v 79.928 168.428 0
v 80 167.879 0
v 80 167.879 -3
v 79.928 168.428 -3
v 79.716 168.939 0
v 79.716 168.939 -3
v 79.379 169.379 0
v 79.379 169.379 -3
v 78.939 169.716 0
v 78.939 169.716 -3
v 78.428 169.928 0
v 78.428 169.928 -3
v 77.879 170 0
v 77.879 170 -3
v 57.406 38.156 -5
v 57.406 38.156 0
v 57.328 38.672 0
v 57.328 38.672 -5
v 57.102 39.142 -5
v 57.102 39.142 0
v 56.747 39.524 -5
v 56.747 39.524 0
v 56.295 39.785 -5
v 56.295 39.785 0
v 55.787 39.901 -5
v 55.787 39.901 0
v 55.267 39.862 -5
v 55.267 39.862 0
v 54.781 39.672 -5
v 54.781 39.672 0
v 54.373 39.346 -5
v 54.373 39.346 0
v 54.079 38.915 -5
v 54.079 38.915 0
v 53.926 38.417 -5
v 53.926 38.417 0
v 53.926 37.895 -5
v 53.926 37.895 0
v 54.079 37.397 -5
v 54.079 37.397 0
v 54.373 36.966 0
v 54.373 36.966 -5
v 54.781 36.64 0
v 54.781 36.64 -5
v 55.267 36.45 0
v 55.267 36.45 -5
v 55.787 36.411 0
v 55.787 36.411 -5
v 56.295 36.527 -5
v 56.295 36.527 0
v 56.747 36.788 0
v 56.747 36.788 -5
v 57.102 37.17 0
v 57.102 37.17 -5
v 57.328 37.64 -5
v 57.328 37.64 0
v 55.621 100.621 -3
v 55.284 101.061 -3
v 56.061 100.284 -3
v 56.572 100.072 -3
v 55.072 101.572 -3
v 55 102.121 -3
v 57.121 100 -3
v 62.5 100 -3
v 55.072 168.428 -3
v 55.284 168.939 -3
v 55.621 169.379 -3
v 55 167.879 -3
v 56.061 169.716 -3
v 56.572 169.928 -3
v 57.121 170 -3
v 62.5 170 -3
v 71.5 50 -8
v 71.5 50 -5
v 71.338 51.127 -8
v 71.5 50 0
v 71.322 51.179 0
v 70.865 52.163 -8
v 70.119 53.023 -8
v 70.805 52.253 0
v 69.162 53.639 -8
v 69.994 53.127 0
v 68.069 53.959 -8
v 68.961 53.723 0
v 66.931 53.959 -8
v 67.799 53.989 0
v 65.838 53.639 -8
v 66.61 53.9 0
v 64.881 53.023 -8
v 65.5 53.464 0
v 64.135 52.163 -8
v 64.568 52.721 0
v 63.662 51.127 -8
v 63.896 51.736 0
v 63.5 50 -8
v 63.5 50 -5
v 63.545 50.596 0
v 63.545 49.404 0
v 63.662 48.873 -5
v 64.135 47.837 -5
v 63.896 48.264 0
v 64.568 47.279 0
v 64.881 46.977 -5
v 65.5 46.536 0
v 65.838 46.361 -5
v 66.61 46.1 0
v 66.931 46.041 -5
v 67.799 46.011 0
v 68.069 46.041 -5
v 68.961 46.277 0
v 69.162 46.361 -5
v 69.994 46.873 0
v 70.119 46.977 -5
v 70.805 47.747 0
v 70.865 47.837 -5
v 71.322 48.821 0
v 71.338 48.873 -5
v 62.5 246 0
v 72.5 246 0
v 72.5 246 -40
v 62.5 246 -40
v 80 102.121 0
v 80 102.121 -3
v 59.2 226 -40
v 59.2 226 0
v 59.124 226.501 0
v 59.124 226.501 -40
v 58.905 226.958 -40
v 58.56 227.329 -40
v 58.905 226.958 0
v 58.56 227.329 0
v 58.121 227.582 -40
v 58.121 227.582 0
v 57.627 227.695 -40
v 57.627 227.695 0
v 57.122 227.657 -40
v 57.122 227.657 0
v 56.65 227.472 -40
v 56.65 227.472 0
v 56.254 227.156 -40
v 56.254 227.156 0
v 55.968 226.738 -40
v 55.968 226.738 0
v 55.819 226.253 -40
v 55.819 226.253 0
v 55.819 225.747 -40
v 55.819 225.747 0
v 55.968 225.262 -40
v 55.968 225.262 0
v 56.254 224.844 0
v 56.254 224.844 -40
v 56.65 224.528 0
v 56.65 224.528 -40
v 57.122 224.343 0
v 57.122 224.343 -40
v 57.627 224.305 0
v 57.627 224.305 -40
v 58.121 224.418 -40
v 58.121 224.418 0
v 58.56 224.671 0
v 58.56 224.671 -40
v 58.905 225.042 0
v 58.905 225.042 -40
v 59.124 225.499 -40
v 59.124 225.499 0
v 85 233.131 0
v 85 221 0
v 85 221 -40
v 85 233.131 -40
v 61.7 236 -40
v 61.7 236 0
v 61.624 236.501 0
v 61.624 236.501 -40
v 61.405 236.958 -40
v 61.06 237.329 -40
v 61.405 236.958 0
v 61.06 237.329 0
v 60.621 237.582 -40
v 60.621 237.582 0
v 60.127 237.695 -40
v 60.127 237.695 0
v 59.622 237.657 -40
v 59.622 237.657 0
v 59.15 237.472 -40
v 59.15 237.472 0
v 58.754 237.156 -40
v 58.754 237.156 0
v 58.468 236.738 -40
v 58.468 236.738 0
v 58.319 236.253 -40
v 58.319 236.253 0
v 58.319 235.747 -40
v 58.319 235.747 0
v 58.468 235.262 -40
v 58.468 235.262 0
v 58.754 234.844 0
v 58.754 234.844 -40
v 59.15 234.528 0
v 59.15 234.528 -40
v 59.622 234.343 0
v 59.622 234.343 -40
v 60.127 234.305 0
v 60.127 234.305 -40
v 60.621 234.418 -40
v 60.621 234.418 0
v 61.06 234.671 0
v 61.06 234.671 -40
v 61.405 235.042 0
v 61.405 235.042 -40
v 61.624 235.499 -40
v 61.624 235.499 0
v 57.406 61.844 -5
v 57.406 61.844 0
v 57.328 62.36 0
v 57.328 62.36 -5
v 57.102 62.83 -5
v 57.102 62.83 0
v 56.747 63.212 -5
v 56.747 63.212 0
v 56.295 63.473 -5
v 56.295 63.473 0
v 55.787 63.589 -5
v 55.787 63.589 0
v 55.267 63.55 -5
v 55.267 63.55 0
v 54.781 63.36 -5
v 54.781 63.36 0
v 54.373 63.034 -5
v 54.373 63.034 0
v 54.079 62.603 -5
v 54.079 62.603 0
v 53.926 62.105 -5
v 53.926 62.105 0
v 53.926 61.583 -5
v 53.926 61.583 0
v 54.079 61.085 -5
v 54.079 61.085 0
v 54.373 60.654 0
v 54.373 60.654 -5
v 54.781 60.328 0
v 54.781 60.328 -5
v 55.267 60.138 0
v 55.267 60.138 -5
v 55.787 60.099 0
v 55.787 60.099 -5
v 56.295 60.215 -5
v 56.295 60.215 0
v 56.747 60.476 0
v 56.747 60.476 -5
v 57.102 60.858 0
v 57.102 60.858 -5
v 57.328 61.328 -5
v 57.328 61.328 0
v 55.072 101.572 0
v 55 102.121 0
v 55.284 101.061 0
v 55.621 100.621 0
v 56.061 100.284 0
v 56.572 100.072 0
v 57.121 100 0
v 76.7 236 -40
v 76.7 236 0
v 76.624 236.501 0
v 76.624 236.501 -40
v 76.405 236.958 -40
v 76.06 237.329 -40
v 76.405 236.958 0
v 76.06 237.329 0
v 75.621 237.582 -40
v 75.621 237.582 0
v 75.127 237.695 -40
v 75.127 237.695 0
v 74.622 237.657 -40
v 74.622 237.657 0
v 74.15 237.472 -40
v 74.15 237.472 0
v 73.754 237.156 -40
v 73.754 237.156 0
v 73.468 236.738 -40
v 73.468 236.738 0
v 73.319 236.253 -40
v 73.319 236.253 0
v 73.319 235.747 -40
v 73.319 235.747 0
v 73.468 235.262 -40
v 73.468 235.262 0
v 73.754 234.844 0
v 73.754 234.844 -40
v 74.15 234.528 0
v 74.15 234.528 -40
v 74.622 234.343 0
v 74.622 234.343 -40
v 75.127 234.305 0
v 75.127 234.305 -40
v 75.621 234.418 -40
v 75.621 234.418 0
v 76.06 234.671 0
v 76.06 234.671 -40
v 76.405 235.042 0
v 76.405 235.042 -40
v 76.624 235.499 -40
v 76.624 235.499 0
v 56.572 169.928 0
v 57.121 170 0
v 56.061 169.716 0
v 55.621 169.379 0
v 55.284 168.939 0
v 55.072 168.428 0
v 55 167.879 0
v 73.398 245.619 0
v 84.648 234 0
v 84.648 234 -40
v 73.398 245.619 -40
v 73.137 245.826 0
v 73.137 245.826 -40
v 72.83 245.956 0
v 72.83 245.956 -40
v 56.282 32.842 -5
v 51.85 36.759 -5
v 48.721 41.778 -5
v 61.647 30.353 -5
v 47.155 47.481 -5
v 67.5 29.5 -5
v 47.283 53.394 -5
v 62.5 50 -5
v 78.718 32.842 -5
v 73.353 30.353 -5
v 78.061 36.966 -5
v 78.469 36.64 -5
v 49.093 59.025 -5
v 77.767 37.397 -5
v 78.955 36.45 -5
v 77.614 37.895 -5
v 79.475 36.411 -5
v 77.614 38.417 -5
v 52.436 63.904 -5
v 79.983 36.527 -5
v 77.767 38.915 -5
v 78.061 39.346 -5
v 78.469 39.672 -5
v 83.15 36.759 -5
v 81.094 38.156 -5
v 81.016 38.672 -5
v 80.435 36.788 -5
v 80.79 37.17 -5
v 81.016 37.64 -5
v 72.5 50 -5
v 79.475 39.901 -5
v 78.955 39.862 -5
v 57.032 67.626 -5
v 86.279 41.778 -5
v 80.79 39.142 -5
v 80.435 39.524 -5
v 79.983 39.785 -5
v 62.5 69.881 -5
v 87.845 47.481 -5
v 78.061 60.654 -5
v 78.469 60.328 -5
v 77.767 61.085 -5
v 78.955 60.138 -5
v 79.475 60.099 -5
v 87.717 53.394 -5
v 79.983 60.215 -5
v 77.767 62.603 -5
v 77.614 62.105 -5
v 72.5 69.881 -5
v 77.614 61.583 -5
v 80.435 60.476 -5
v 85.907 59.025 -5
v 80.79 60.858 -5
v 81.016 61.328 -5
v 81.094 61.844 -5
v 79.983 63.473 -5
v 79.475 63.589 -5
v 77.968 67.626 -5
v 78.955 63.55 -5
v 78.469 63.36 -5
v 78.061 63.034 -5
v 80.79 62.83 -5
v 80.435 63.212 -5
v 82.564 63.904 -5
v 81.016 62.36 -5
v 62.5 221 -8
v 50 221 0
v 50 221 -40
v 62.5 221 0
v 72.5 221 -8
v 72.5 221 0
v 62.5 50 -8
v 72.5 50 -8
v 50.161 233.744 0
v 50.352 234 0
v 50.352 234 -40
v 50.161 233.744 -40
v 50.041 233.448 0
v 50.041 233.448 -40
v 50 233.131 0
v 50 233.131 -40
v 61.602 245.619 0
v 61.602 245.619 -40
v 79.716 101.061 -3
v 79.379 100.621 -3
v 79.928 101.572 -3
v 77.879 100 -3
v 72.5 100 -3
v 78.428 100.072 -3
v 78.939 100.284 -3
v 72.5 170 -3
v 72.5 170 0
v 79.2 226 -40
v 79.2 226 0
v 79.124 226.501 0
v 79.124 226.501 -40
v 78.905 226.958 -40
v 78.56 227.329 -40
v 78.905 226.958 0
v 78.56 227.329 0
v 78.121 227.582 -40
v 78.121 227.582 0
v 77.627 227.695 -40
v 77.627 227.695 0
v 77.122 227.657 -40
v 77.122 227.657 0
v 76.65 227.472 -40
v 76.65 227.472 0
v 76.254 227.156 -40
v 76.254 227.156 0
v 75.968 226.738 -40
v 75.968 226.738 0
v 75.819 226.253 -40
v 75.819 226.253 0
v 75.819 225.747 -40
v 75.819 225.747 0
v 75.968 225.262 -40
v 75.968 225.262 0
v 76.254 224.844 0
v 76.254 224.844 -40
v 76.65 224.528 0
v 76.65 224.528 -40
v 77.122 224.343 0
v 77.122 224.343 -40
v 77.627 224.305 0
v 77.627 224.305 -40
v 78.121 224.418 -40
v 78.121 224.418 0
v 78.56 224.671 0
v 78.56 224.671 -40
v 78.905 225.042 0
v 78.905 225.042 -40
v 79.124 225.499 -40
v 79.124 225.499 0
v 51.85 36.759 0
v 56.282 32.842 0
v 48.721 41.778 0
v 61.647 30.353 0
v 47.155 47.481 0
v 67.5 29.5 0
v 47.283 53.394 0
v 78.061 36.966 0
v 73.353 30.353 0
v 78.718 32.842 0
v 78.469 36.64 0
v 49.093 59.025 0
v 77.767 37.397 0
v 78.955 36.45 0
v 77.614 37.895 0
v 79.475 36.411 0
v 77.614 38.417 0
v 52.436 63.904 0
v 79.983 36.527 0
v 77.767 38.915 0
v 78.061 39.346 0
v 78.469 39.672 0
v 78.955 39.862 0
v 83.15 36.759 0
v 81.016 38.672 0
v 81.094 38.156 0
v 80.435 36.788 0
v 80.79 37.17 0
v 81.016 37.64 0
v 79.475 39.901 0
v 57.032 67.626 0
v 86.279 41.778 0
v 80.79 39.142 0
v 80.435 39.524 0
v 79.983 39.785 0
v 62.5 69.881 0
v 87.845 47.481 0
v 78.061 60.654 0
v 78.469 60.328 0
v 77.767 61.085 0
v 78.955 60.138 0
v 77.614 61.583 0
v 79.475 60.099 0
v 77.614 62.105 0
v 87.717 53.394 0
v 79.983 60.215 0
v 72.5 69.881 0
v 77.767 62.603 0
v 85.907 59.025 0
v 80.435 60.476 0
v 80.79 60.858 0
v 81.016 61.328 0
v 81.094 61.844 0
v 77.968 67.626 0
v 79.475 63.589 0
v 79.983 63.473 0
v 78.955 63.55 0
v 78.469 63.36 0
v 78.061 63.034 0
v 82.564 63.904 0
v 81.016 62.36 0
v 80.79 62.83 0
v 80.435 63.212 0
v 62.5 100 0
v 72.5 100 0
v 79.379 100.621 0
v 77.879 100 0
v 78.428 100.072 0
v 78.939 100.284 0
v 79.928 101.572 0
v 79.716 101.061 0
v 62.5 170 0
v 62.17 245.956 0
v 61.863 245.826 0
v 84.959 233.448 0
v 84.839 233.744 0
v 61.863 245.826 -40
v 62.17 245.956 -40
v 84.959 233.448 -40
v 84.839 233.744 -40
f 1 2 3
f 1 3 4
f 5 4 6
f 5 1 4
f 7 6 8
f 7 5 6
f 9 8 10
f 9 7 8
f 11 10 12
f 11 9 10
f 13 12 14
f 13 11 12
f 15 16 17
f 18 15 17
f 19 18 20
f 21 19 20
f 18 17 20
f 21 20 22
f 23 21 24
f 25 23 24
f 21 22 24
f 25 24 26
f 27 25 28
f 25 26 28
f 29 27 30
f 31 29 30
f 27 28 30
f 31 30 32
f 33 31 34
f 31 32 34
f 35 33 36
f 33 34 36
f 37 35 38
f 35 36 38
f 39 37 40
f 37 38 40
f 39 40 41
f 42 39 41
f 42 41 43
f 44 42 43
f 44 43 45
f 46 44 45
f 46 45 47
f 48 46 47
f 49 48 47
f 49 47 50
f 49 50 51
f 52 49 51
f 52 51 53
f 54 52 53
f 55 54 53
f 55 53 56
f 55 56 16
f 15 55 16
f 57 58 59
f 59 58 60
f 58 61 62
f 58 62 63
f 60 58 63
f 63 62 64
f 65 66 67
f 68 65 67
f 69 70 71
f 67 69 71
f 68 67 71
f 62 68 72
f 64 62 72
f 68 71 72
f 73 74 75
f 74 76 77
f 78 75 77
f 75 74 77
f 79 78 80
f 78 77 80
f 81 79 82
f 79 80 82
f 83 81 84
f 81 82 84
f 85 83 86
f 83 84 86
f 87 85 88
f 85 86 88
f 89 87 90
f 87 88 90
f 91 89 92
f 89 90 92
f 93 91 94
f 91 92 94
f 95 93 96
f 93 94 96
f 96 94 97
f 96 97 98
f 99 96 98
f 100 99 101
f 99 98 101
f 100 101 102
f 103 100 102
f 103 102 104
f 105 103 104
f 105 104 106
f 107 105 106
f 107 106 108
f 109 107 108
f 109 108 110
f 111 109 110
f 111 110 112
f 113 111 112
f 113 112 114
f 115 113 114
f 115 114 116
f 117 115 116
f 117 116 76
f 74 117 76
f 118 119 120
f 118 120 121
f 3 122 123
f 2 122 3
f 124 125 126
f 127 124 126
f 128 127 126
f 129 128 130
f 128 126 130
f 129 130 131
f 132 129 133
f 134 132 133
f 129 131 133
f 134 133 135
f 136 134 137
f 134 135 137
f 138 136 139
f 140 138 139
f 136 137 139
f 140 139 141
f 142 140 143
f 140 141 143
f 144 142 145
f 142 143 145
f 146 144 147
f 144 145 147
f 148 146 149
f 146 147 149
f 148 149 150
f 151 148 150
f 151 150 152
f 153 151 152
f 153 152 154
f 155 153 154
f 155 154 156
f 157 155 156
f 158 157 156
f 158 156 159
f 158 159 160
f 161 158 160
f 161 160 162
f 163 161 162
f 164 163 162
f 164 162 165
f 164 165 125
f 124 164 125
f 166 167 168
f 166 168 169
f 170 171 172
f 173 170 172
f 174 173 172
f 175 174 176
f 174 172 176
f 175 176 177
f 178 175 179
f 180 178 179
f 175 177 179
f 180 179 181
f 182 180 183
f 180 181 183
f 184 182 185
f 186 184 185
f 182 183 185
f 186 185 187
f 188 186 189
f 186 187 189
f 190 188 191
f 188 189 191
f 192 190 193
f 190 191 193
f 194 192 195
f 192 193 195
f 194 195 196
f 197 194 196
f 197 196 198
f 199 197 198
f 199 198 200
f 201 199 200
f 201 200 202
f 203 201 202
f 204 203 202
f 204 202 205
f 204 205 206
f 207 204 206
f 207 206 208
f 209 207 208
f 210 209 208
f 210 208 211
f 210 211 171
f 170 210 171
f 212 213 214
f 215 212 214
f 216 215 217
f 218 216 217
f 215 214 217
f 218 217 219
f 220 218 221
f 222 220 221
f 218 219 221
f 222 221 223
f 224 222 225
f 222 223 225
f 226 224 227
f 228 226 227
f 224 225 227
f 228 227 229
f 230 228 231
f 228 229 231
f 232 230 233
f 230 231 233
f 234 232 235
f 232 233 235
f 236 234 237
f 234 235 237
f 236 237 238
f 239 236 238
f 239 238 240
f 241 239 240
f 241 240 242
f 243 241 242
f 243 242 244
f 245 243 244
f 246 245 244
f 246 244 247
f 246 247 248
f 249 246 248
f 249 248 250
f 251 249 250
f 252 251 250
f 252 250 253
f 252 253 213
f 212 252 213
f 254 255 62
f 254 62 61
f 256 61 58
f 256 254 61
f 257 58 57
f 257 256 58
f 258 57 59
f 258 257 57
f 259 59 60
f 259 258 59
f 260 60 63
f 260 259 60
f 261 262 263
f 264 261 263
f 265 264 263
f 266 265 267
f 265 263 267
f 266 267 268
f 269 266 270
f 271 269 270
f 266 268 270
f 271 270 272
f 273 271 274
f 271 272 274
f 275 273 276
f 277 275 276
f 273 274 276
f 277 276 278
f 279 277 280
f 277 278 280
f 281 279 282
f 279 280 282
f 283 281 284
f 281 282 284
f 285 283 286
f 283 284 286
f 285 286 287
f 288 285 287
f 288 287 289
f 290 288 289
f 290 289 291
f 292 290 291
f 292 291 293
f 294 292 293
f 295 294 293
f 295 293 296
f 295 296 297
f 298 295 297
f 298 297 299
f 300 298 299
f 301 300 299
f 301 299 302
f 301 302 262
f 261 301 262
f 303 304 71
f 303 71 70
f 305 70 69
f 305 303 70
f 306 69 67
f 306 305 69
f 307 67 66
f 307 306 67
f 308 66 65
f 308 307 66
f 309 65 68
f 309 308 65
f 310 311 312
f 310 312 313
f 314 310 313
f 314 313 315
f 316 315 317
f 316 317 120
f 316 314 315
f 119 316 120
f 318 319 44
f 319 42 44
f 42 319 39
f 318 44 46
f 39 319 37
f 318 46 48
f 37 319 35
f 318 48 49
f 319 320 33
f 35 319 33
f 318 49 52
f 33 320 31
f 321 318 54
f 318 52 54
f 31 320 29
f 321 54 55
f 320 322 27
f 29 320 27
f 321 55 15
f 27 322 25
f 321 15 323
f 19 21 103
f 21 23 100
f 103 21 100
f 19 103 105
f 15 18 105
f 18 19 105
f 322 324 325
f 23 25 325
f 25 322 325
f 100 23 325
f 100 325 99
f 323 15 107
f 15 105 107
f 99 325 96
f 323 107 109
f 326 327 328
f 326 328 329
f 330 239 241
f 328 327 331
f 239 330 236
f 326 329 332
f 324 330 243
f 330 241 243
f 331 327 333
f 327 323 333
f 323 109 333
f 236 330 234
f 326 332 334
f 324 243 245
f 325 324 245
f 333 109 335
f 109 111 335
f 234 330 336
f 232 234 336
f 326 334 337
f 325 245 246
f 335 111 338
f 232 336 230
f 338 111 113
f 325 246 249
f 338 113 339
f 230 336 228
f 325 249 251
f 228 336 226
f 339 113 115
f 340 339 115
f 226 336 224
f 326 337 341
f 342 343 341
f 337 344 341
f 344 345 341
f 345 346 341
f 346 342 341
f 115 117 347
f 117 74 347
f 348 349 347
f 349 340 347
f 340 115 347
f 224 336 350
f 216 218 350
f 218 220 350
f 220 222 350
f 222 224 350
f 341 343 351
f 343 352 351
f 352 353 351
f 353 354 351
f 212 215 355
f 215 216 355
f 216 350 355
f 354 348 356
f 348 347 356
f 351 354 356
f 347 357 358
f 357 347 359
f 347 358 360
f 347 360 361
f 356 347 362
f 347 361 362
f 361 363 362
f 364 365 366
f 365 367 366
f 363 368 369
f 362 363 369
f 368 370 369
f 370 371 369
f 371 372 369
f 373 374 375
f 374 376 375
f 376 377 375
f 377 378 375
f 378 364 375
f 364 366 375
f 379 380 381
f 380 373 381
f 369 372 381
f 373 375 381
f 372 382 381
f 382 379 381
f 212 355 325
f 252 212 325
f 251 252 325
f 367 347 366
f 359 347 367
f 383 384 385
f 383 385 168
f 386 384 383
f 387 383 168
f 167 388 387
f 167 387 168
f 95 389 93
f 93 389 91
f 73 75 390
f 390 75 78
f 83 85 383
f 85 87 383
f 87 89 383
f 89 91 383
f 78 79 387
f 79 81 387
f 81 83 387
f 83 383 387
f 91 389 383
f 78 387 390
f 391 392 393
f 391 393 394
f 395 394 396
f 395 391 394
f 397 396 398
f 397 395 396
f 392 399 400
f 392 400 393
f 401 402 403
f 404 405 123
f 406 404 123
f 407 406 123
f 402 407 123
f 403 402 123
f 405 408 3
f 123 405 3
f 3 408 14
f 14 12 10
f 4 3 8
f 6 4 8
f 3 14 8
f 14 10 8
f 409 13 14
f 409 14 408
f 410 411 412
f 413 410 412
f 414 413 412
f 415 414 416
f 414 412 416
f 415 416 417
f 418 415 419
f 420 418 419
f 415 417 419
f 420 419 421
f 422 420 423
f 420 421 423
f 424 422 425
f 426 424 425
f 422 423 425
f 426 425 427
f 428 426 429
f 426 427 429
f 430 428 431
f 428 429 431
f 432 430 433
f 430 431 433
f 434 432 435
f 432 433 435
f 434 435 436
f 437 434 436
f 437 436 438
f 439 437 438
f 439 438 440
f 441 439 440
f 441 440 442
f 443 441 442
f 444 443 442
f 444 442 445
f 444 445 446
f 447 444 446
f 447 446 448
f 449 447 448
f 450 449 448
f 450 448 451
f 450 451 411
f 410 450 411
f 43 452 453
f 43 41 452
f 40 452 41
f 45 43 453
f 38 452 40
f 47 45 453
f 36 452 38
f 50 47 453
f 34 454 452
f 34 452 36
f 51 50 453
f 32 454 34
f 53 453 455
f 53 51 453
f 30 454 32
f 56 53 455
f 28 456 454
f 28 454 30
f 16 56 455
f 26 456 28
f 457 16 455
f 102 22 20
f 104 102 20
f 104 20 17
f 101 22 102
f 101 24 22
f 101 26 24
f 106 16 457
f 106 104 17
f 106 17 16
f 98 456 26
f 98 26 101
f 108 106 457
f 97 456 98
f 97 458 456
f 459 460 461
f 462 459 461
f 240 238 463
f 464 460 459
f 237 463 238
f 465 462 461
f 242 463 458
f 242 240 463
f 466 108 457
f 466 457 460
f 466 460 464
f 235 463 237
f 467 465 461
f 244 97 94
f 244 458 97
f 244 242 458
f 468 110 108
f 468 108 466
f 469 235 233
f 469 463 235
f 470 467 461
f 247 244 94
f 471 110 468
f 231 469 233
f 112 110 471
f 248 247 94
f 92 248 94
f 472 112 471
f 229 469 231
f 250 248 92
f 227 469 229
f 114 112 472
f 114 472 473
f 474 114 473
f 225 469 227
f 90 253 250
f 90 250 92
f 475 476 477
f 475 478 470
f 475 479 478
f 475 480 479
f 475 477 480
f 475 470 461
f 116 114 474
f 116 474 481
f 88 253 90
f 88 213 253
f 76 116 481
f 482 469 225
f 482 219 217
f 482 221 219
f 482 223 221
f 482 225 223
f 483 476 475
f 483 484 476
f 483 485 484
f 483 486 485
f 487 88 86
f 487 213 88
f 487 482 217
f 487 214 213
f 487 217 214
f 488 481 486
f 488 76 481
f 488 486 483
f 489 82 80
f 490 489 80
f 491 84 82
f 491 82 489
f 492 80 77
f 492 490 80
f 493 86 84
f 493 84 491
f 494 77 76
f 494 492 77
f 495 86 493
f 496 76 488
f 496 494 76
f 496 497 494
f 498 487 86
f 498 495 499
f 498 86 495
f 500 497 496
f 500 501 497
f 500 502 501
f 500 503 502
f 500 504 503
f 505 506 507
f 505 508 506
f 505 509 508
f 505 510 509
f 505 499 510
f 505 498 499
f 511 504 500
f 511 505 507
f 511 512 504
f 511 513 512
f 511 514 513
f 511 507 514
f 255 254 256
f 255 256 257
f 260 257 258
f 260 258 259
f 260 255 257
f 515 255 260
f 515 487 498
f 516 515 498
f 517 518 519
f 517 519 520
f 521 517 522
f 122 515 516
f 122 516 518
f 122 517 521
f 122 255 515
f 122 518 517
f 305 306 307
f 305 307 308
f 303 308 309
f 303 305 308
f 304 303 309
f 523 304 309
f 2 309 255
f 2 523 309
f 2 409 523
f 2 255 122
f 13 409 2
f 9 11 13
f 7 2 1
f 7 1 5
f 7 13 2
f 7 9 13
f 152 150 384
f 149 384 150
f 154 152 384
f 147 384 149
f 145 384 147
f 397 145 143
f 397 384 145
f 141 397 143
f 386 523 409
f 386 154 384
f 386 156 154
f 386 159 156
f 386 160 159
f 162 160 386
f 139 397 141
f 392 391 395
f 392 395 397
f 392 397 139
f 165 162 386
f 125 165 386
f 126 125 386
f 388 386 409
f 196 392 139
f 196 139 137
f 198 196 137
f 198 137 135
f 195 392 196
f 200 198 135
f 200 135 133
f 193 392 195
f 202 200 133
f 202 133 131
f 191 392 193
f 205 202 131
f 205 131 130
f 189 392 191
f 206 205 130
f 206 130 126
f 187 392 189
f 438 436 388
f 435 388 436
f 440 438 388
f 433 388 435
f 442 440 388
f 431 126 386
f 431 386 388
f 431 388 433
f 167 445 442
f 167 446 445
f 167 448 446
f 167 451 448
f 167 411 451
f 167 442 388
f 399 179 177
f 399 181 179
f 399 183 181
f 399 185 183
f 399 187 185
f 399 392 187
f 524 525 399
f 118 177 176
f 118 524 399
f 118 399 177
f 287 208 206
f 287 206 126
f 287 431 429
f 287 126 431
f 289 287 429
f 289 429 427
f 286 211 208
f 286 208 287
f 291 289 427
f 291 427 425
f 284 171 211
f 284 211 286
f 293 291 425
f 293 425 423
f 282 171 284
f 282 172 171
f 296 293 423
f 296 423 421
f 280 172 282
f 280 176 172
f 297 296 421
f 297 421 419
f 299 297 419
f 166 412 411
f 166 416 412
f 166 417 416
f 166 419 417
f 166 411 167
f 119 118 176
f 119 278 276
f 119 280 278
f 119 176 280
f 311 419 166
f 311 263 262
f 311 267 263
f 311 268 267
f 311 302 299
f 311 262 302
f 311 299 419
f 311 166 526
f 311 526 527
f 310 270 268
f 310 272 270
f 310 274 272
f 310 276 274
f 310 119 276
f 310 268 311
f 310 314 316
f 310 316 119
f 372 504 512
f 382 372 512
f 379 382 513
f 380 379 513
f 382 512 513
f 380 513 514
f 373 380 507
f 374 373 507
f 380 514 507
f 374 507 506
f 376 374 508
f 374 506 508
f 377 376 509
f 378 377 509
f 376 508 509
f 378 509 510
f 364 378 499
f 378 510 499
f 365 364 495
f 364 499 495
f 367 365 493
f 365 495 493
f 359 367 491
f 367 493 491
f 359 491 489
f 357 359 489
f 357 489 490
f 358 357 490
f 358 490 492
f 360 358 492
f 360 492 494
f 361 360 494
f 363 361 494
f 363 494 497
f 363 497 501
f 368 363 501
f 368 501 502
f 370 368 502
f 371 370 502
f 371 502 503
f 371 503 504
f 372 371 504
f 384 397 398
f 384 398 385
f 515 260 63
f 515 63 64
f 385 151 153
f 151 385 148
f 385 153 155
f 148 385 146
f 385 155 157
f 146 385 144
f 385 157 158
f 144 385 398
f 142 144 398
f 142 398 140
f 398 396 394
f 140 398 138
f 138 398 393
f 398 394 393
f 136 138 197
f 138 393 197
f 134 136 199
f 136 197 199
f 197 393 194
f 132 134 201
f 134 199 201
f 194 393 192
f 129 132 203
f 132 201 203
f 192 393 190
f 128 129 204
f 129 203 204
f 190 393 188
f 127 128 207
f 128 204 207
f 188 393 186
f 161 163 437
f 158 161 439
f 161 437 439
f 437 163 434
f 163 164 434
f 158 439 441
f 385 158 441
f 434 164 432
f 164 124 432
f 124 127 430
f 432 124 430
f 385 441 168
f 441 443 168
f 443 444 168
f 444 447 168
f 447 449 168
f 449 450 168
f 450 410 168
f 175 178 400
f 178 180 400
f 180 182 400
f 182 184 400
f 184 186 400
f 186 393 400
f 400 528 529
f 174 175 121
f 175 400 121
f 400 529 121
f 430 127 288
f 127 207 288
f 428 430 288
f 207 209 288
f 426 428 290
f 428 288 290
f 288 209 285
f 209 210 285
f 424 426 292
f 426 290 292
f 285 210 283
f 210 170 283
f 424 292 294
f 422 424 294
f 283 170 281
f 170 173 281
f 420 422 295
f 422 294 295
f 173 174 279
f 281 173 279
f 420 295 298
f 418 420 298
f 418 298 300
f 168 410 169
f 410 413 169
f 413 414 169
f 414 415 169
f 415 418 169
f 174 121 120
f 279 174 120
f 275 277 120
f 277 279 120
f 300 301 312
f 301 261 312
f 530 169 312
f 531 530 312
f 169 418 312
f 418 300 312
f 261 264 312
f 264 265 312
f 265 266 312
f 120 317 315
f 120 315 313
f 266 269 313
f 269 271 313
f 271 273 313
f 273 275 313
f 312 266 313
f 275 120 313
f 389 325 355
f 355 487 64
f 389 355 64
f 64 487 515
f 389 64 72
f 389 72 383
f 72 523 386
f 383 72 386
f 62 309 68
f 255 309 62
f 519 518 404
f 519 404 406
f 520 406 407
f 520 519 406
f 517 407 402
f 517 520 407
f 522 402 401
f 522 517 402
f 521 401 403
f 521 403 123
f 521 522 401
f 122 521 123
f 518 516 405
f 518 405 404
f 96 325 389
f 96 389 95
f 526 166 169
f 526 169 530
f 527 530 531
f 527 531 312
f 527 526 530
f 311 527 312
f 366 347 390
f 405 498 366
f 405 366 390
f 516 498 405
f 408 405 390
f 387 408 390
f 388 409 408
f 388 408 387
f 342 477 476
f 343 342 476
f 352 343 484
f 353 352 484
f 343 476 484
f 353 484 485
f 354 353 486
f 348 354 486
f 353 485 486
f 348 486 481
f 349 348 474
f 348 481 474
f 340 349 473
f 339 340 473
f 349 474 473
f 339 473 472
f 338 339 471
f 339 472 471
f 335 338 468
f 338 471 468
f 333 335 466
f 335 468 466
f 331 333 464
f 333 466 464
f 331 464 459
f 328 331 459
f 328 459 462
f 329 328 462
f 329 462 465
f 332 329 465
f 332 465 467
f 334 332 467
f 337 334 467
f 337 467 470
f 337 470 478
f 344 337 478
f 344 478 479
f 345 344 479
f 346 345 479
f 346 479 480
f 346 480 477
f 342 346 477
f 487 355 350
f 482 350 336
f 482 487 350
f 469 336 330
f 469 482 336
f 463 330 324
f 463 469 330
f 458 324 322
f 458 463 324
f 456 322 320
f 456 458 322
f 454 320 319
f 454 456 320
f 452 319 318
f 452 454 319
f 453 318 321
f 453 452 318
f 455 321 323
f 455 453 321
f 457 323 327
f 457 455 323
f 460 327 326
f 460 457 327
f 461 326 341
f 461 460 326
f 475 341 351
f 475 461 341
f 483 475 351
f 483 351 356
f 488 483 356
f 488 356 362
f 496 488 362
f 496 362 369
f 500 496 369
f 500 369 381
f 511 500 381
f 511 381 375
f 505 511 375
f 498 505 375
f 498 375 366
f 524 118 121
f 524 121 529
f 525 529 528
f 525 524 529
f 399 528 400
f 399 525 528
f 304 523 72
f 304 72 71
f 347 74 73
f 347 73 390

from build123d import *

# Parameters (mm, degrees)
SKETCH_W      = 10
SKETCH_H      = 171
PAD_DEPTH     = 8
SKETCH001_R   = 20.5
PAD001_DEPTH  = 5
PAD002_DEPTH  = 40
SKETCH004_R   = 1.7
HOLE_DEPTH    = 40.001
PAD003_DEPTH  = 3
SKETCH006_R   = 1.75
SKETCH006_R_2 = 4
POCKET_DEPTH  = 40.001


with BuildPart() as part:
    # Sketch → Pad (new body)
    with BuildSketch(Plane.XY):
        with Locations((67.5, 135.5)):
            Rectangle(SKETCH_W, SKETCH_H)
    extrude(amount=-PAD_DEPTH)

    # Sketch001 → Pad001 (join)
    with BuildSketch(Plane.XY):
        with Locations((67.5, 50)):
            Circle(SKETCH001_R)
    extrude(amount=-PAD001_DEPTH)

    # Sketch003 → Pad002 (join)
    with BuildSketch(Plane.XY):
        with BuildLine():
            Line((50, 221), (85, 221))
            Line((85, 221), (85, 233.13051))
            ThreePointArc((85, 233.13051), (84.908676, 233.599521), (84.648047, 234))
            Line((84.648047, 234), (73.398047, 245.61949))
            ThreePointArc((73.398047, 245.61949), (72.987667, 245.900948), (72.5, 246))
            Line((72.5, 246), (62.5, 246))
            ThreePointArc((62.5, 246), (62.012333, 245.900948), (61.601953, 245.61949))
            Line((61.601953, 245.61949), (50.351953, 234))
            ThreePointArc((50.351953, 234), (50.091324, 233.599521), (50, 233.13051))
            Line((50, 233.13051), (50, 221))
        make_face()
    extrude(amount=-PAD002_DEPTH)

    # Sketch004 → Hole (cut, through all)
    with BuildSketch(Plane.XY):
        with Locations((57.5, 226)):
            Circle(SKETCH004_R)
        with Locations((77.5, 226)):
            Circle(SKETCH004_R)
        with Locations((75, 236)):
            Circle(SKETCH004_R)
        with Locations((60, 236)):
            Circle(SKETCH004_R)
    extrude(amount=-HOLE_DEPTH, mode=Mode.SUBTRACT)

    # Sketch005 → Pad003 (join)
    with BuildSketch(Plane.XY):
        with BuildLine():
            Line((55, 167.87868), (55, 102.12132))
            ThreePointArc((55, 102.12132), (55.62132, 100.62132), (57.12132, 100))
            Line((57.12132, 100), (77.87868, 100))
            ThreePointArc((77.87868, 100), (79.37868, 100.62132), (80, 102.12132))
            Line((80, 102.12132), (80, 167.87868))
            ThreePointArc((80, 167.87868), (79.37868, 169.37868), (77.87868, 170))
            Line((77.87868, 170), (57.12132, 170))
            ThreePointArc((57.12132, 170), (55.62132, 169.37868), (55, 167.87868))
        make_face()
    extrude(amount=-PAD003_DEPTH)

    # Sketch006 → Pocket (cut, through all)
    with BuildSketch(Plane.XY):
        with Locations((79.344039, 38.155961)):
            Circle(SKETCH006_R)
        with Locations((79.344039, 61.844039)):
            Circle(SKETCH006_R)
        with Locations((55.655961, 61.844039)):
            Circle(SKETCH006_R)
        with Locations((55.655961, 38.155961)):
            Circle(SKETCH006_R)
        with Locations((67.5, 50)):
            Circle(SKETCH006_R_2)
    extrude(amount=-POCKET_DEPTH, mode=Mode.SUBTRACT)


solid = part.part
